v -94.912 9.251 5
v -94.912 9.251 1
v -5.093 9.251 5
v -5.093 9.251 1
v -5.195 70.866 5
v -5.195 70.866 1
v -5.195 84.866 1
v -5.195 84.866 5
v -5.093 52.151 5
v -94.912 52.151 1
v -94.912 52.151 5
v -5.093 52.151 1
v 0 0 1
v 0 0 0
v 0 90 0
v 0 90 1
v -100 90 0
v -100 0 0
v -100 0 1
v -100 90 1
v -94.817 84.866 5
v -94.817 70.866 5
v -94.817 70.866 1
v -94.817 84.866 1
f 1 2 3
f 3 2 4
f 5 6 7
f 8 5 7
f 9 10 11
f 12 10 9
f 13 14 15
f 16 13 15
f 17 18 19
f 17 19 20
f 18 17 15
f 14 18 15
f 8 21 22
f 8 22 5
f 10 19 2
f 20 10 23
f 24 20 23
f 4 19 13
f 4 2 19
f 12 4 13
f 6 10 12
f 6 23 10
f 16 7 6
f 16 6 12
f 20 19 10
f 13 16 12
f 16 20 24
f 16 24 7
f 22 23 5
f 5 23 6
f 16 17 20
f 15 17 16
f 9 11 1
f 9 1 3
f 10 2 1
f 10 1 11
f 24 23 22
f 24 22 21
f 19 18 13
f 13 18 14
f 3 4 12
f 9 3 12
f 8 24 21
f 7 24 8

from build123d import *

# Parameters (mm, degrees)
F0_W     = 100
F0_H     = 90
F1_DEPTH = 1
F2_W     = 89.622498
F2_H     = 14
F3_DEPTH = 5
F4_W     = 89.818385
F4_H     = 42.9
F5_DEPTH = 5


with BuildPart() as f1:
    # F0 (on Top) → F1 (new body)
    with BuildSketch(Plane.XY):
        with Locations((-50, 45)):
            Rectangle(F0_W, F0_H)
    extrude(amount=F1_DEPTH)

    # F2 (on Top) → F3 (join)
    with BuildSketch(Plane.XY):
        with Locations((-50.005771, 77.865734)):
            Rectangle(F2_W, F2_H)
    extrude(amount=F3_DEPTH)

    # F4 (on Top) → F5 (join)
    with BuildSketch(Plane.XY):
        with Locations((-50.002643, 30.7011)):
            Rectangle(F4_W, F4_H)
    extrude(amount=F5_DEPTH)


solid = f1.part
